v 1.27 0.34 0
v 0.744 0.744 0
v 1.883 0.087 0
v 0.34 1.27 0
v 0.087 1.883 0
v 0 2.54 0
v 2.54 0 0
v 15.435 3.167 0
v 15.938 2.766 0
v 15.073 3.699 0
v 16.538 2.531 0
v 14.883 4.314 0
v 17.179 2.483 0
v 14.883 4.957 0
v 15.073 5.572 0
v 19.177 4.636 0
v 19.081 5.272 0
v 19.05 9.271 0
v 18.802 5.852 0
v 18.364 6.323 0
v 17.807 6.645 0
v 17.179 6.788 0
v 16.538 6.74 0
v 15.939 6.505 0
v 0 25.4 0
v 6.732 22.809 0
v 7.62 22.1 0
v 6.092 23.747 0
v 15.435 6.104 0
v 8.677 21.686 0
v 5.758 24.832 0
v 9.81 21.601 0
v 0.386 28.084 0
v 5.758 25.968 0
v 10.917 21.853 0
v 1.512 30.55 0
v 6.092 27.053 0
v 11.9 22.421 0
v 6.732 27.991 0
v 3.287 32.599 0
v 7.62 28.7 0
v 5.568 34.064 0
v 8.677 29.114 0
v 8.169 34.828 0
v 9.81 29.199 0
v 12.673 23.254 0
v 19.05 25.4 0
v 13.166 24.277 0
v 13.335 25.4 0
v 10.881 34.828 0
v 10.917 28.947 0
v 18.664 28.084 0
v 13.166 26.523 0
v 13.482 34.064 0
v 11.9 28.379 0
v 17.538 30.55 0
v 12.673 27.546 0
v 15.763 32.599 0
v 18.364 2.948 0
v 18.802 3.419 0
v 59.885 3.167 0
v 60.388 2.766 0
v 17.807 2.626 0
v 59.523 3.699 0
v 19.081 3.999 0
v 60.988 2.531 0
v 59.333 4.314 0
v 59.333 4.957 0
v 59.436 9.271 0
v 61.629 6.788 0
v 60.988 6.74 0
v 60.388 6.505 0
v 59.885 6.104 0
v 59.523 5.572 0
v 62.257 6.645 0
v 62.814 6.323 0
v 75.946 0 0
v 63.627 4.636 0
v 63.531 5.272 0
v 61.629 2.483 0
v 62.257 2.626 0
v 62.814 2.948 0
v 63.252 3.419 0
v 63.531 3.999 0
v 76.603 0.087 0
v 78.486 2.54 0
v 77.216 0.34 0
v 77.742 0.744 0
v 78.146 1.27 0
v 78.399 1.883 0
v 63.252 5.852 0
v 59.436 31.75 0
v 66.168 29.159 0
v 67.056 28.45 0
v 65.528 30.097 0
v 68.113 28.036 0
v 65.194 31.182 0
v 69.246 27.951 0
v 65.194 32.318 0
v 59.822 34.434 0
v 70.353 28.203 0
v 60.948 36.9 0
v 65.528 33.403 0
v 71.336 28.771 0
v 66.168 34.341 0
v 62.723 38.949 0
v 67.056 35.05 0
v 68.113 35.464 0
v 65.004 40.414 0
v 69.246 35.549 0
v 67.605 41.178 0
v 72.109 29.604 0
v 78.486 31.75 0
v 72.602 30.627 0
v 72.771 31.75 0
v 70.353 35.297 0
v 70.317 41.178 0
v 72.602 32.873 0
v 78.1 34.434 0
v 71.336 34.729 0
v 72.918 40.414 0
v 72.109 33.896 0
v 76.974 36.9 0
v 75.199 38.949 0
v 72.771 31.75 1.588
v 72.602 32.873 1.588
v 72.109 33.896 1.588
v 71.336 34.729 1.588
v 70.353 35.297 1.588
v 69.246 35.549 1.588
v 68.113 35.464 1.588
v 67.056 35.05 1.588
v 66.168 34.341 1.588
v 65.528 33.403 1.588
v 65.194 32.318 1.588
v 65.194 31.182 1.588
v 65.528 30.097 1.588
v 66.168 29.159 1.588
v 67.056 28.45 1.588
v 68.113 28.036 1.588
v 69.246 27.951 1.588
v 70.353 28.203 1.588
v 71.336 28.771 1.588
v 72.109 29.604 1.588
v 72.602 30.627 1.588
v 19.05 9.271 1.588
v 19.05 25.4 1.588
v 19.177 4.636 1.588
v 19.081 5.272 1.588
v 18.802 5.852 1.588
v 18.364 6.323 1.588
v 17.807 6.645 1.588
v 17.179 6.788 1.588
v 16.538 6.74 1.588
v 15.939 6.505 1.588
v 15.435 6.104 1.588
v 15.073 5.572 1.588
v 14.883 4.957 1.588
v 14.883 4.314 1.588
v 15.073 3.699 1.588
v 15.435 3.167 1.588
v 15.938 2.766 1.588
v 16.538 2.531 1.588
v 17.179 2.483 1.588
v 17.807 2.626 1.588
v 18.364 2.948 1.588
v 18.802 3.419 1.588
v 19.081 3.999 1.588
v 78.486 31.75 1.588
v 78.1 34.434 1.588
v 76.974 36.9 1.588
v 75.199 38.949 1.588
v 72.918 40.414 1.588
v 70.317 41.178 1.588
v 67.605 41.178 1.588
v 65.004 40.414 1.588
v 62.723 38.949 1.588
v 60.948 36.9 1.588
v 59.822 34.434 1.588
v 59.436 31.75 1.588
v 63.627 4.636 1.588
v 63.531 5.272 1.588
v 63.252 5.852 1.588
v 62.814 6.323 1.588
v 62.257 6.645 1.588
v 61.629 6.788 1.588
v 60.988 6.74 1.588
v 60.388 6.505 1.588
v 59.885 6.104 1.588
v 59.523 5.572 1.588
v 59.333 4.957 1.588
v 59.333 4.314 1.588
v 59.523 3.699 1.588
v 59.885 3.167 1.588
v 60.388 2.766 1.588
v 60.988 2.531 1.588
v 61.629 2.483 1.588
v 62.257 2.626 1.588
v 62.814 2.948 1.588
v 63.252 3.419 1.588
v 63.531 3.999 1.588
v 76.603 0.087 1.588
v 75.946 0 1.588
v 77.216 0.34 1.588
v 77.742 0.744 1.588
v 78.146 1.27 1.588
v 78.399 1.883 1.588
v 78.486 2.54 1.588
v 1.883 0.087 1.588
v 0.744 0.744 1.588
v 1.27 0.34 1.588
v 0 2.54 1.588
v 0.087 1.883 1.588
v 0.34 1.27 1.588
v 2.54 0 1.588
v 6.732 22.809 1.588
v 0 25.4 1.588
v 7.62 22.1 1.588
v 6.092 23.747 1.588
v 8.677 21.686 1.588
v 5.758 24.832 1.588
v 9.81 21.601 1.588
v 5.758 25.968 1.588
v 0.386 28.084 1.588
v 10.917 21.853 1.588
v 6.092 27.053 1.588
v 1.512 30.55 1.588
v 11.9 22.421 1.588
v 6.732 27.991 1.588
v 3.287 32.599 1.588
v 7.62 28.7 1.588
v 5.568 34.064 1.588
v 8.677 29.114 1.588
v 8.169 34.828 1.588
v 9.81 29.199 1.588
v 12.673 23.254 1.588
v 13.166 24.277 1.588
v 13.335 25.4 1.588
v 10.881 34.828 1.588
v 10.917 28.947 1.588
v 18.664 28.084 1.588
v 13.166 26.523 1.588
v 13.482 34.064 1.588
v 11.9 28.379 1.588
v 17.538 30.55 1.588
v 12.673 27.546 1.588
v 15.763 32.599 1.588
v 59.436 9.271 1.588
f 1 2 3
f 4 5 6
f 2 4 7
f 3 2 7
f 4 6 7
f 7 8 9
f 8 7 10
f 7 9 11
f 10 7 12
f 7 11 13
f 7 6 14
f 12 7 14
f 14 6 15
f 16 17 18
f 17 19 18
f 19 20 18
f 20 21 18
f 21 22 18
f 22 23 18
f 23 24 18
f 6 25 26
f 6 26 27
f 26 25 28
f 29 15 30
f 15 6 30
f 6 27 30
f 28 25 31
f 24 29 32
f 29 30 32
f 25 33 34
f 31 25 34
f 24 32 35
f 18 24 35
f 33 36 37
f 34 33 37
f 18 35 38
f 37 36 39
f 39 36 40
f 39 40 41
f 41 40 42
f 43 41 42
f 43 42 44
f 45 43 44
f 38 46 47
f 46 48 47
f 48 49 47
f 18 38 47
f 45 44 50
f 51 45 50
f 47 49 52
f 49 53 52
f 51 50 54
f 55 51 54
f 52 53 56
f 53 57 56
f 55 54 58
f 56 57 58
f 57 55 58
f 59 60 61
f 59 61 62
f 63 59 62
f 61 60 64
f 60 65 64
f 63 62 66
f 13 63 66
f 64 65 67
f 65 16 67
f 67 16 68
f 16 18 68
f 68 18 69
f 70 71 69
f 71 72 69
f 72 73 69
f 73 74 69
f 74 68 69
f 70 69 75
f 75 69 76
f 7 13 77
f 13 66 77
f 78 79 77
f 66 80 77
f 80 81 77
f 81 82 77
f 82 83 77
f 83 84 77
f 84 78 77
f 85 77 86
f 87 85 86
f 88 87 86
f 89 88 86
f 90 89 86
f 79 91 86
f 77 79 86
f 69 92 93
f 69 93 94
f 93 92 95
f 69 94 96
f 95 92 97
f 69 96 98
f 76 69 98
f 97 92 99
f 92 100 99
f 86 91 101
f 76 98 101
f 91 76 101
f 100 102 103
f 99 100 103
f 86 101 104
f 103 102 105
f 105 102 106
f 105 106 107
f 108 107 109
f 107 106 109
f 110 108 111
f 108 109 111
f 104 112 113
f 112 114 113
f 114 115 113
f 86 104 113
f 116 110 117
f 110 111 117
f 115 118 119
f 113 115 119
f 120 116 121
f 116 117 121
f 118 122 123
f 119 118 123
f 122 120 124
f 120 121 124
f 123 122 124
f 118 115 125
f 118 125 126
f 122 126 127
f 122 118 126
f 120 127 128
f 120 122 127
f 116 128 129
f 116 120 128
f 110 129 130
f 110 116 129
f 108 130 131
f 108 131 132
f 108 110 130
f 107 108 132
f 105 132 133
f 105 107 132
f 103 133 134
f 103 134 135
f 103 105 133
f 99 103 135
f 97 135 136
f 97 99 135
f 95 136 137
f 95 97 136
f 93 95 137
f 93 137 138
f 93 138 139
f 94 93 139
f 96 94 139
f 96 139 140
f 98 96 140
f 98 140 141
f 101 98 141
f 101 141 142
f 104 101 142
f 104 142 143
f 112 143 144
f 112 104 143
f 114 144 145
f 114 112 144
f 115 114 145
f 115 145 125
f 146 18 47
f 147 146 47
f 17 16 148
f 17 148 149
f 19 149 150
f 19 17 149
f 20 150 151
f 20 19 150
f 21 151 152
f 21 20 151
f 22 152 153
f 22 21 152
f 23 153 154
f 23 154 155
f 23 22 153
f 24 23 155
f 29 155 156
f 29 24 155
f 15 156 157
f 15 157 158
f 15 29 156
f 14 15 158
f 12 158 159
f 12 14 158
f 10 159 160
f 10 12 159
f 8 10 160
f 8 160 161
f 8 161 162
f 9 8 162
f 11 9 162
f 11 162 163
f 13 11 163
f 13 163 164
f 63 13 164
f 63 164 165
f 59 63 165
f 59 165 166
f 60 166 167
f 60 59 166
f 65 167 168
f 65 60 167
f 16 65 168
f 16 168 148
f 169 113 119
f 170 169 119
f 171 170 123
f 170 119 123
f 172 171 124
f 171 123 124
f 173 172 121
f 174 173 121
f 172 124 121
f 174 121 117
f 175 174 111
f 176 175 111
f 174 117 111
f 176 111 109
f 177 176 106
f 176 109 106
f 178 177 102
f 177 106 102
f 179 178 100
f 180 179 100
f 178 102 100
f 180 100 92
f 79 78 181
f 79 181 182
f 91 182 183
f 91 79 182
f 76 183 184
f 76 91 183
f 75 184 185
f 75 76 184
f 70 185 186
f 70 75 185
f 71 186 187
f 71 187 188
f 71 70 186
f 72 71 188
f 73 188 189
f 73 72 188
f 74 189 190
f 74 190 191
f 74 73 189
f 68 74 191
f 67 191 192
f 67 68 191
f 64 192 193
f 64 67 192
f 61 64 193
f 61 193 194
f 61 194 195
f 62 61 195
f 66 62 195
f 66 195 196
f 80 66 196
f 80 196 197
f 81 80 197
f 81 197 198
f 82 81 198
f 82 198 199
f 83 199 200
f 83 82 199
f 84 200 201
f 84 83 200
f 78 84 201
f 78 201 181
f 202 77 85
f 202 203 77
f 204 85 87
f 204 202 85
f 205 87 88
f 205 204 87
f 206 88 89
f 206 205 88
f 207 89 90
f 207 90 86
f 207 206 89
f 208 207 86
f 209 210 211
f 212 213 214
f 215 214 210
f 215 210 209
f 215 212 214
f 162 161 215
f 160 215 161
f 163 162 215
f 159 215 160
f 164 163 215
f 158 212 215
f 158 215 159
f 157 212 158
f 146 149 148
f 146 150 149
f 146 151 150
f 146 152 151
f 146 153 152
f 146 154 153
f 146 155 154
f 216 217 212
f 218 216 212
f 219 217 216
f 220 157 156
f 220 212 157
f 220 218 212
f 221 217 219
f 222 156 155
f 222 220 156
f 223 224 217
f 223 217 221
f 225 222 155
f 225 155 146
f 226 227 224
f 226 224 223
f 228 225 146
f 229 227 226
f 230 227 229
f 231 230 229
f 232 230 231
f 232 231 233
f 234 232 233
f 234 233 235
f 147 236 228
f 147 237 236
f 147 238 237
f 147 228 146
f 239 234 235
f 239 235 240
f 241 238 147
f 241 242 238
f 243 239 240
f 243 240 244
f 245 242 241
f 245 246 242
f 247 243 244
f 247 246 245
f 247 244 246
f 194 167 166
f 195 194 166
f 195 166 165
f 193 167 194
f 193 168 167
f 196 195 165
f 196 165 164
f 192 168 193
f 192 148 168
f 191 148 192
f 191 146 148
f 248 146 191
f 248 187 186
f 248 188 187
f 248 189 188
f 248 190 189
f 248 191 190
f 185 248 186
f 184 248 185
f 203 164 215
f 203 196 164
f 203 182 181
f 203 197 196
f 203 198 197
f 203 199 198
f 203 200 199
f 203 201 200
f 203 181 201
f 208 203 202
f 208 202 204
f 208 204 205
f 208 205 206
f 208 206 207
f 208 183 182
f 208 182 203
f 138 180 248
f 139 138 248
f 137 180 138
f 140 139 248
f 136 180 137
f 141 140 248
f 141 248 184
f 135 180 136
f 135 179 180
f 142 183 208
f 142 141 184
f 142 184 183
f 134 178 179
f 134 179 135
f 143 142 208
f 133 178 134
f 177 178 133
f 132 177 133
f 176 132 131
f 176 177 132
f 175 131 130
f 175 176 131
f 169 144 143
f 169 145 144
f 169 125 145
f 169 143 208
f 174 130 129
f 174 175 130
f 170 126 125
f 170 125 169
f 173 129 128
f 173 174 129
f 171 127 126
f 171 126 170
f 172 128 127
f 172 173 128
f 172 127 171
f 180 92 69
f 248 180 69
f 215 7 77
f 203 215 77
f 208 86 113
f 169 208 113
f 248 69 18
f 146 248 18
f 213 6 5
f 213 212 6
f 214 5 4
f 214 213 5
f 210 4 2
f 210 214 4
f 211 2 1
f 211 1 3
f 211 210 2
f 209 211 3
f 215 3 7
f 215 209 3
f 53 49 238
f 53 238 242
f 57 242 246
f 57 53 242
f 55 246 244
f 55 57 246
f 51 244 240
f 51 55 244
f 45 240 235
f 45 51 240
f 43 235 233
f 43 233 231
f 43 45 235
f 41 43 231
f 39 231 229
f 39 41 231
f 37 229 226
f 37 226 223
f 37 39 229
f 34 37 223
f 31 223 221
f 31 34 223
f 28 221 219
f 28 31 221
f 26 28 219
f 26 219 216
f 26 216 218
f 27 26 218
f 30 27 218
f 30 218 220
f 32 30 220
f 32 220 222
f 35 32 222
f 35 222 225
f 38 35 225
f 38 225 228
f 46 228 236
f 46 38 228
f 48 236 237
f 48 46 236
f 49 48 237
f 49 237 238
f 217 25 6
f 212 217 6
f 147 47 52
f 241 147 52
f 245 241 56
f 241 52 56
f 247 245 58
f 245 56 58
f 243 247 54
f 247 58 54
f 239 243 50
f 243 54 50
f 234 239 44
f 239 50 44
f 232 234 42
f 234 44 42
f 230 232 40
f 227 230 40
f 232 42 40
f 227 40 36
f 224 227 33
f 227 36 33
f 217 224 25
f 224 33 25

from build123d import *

# Parameters (mm, degrees)
SKETCH1_R           = 2.159
SKETCH1_R_2         = 3.81
BOSS_EXTRUDE1_DEPTH = 1.5875
FILLET1_R           = 2.54


with BuildPart() as part:
    # Sketch1 → Boss-Extrude1 (new body)
    with BuildSketch(Plane.XY):
        with BuildLine():
            Line((0, 25.4), (0, 0))
            Line((0, 0), (78.486, 0))
            Line((78.486, 0), (78.486, 31.75))
            ThreePointArc((78.486, 31.75), (68.961, 41.275), (59.436, 31.75))
            Line((59.436, 31.75), (59.436, 9.271))
            Line((59.436, 9.271), (19.05, 9.271))
            Line((19.05, 9.271), (19.05, 25.4))
            ThreePointArc((19.05, 25.4), (9.525, 34.925), (0, 25.4))
        make_face()
        with Locations((17.018, 4.6355)):
            Circle(SKETCH1_R, mode=Mode.SUBTRACT)
        with Locations((61.468, 4.6355)):
            Circle(SKETCH1_R, mode=Mode.SUBTRACT)
        with Locations((9.525, 25.4)):
            Circle(SKETCH1_R_2, mode=Mode.SUBTRACT)
        with Locations((68.961, 31.75)):
            Circle(SKETCH1_R_2, mode=Mode.SUBTRACT)
    extrude(amount=BOSS_EXTRUDE1_DEPTH)

    # Fillet1
    fillet1_edges = [part.edges().sort_by_distance(p)[0] for p in [
        (78.486, 0, 0.79375),
        (0, 0, 0.79375),
    ]]
    fillet(fillet1_edges, radius=FILLET1_R)


solid = part.part
